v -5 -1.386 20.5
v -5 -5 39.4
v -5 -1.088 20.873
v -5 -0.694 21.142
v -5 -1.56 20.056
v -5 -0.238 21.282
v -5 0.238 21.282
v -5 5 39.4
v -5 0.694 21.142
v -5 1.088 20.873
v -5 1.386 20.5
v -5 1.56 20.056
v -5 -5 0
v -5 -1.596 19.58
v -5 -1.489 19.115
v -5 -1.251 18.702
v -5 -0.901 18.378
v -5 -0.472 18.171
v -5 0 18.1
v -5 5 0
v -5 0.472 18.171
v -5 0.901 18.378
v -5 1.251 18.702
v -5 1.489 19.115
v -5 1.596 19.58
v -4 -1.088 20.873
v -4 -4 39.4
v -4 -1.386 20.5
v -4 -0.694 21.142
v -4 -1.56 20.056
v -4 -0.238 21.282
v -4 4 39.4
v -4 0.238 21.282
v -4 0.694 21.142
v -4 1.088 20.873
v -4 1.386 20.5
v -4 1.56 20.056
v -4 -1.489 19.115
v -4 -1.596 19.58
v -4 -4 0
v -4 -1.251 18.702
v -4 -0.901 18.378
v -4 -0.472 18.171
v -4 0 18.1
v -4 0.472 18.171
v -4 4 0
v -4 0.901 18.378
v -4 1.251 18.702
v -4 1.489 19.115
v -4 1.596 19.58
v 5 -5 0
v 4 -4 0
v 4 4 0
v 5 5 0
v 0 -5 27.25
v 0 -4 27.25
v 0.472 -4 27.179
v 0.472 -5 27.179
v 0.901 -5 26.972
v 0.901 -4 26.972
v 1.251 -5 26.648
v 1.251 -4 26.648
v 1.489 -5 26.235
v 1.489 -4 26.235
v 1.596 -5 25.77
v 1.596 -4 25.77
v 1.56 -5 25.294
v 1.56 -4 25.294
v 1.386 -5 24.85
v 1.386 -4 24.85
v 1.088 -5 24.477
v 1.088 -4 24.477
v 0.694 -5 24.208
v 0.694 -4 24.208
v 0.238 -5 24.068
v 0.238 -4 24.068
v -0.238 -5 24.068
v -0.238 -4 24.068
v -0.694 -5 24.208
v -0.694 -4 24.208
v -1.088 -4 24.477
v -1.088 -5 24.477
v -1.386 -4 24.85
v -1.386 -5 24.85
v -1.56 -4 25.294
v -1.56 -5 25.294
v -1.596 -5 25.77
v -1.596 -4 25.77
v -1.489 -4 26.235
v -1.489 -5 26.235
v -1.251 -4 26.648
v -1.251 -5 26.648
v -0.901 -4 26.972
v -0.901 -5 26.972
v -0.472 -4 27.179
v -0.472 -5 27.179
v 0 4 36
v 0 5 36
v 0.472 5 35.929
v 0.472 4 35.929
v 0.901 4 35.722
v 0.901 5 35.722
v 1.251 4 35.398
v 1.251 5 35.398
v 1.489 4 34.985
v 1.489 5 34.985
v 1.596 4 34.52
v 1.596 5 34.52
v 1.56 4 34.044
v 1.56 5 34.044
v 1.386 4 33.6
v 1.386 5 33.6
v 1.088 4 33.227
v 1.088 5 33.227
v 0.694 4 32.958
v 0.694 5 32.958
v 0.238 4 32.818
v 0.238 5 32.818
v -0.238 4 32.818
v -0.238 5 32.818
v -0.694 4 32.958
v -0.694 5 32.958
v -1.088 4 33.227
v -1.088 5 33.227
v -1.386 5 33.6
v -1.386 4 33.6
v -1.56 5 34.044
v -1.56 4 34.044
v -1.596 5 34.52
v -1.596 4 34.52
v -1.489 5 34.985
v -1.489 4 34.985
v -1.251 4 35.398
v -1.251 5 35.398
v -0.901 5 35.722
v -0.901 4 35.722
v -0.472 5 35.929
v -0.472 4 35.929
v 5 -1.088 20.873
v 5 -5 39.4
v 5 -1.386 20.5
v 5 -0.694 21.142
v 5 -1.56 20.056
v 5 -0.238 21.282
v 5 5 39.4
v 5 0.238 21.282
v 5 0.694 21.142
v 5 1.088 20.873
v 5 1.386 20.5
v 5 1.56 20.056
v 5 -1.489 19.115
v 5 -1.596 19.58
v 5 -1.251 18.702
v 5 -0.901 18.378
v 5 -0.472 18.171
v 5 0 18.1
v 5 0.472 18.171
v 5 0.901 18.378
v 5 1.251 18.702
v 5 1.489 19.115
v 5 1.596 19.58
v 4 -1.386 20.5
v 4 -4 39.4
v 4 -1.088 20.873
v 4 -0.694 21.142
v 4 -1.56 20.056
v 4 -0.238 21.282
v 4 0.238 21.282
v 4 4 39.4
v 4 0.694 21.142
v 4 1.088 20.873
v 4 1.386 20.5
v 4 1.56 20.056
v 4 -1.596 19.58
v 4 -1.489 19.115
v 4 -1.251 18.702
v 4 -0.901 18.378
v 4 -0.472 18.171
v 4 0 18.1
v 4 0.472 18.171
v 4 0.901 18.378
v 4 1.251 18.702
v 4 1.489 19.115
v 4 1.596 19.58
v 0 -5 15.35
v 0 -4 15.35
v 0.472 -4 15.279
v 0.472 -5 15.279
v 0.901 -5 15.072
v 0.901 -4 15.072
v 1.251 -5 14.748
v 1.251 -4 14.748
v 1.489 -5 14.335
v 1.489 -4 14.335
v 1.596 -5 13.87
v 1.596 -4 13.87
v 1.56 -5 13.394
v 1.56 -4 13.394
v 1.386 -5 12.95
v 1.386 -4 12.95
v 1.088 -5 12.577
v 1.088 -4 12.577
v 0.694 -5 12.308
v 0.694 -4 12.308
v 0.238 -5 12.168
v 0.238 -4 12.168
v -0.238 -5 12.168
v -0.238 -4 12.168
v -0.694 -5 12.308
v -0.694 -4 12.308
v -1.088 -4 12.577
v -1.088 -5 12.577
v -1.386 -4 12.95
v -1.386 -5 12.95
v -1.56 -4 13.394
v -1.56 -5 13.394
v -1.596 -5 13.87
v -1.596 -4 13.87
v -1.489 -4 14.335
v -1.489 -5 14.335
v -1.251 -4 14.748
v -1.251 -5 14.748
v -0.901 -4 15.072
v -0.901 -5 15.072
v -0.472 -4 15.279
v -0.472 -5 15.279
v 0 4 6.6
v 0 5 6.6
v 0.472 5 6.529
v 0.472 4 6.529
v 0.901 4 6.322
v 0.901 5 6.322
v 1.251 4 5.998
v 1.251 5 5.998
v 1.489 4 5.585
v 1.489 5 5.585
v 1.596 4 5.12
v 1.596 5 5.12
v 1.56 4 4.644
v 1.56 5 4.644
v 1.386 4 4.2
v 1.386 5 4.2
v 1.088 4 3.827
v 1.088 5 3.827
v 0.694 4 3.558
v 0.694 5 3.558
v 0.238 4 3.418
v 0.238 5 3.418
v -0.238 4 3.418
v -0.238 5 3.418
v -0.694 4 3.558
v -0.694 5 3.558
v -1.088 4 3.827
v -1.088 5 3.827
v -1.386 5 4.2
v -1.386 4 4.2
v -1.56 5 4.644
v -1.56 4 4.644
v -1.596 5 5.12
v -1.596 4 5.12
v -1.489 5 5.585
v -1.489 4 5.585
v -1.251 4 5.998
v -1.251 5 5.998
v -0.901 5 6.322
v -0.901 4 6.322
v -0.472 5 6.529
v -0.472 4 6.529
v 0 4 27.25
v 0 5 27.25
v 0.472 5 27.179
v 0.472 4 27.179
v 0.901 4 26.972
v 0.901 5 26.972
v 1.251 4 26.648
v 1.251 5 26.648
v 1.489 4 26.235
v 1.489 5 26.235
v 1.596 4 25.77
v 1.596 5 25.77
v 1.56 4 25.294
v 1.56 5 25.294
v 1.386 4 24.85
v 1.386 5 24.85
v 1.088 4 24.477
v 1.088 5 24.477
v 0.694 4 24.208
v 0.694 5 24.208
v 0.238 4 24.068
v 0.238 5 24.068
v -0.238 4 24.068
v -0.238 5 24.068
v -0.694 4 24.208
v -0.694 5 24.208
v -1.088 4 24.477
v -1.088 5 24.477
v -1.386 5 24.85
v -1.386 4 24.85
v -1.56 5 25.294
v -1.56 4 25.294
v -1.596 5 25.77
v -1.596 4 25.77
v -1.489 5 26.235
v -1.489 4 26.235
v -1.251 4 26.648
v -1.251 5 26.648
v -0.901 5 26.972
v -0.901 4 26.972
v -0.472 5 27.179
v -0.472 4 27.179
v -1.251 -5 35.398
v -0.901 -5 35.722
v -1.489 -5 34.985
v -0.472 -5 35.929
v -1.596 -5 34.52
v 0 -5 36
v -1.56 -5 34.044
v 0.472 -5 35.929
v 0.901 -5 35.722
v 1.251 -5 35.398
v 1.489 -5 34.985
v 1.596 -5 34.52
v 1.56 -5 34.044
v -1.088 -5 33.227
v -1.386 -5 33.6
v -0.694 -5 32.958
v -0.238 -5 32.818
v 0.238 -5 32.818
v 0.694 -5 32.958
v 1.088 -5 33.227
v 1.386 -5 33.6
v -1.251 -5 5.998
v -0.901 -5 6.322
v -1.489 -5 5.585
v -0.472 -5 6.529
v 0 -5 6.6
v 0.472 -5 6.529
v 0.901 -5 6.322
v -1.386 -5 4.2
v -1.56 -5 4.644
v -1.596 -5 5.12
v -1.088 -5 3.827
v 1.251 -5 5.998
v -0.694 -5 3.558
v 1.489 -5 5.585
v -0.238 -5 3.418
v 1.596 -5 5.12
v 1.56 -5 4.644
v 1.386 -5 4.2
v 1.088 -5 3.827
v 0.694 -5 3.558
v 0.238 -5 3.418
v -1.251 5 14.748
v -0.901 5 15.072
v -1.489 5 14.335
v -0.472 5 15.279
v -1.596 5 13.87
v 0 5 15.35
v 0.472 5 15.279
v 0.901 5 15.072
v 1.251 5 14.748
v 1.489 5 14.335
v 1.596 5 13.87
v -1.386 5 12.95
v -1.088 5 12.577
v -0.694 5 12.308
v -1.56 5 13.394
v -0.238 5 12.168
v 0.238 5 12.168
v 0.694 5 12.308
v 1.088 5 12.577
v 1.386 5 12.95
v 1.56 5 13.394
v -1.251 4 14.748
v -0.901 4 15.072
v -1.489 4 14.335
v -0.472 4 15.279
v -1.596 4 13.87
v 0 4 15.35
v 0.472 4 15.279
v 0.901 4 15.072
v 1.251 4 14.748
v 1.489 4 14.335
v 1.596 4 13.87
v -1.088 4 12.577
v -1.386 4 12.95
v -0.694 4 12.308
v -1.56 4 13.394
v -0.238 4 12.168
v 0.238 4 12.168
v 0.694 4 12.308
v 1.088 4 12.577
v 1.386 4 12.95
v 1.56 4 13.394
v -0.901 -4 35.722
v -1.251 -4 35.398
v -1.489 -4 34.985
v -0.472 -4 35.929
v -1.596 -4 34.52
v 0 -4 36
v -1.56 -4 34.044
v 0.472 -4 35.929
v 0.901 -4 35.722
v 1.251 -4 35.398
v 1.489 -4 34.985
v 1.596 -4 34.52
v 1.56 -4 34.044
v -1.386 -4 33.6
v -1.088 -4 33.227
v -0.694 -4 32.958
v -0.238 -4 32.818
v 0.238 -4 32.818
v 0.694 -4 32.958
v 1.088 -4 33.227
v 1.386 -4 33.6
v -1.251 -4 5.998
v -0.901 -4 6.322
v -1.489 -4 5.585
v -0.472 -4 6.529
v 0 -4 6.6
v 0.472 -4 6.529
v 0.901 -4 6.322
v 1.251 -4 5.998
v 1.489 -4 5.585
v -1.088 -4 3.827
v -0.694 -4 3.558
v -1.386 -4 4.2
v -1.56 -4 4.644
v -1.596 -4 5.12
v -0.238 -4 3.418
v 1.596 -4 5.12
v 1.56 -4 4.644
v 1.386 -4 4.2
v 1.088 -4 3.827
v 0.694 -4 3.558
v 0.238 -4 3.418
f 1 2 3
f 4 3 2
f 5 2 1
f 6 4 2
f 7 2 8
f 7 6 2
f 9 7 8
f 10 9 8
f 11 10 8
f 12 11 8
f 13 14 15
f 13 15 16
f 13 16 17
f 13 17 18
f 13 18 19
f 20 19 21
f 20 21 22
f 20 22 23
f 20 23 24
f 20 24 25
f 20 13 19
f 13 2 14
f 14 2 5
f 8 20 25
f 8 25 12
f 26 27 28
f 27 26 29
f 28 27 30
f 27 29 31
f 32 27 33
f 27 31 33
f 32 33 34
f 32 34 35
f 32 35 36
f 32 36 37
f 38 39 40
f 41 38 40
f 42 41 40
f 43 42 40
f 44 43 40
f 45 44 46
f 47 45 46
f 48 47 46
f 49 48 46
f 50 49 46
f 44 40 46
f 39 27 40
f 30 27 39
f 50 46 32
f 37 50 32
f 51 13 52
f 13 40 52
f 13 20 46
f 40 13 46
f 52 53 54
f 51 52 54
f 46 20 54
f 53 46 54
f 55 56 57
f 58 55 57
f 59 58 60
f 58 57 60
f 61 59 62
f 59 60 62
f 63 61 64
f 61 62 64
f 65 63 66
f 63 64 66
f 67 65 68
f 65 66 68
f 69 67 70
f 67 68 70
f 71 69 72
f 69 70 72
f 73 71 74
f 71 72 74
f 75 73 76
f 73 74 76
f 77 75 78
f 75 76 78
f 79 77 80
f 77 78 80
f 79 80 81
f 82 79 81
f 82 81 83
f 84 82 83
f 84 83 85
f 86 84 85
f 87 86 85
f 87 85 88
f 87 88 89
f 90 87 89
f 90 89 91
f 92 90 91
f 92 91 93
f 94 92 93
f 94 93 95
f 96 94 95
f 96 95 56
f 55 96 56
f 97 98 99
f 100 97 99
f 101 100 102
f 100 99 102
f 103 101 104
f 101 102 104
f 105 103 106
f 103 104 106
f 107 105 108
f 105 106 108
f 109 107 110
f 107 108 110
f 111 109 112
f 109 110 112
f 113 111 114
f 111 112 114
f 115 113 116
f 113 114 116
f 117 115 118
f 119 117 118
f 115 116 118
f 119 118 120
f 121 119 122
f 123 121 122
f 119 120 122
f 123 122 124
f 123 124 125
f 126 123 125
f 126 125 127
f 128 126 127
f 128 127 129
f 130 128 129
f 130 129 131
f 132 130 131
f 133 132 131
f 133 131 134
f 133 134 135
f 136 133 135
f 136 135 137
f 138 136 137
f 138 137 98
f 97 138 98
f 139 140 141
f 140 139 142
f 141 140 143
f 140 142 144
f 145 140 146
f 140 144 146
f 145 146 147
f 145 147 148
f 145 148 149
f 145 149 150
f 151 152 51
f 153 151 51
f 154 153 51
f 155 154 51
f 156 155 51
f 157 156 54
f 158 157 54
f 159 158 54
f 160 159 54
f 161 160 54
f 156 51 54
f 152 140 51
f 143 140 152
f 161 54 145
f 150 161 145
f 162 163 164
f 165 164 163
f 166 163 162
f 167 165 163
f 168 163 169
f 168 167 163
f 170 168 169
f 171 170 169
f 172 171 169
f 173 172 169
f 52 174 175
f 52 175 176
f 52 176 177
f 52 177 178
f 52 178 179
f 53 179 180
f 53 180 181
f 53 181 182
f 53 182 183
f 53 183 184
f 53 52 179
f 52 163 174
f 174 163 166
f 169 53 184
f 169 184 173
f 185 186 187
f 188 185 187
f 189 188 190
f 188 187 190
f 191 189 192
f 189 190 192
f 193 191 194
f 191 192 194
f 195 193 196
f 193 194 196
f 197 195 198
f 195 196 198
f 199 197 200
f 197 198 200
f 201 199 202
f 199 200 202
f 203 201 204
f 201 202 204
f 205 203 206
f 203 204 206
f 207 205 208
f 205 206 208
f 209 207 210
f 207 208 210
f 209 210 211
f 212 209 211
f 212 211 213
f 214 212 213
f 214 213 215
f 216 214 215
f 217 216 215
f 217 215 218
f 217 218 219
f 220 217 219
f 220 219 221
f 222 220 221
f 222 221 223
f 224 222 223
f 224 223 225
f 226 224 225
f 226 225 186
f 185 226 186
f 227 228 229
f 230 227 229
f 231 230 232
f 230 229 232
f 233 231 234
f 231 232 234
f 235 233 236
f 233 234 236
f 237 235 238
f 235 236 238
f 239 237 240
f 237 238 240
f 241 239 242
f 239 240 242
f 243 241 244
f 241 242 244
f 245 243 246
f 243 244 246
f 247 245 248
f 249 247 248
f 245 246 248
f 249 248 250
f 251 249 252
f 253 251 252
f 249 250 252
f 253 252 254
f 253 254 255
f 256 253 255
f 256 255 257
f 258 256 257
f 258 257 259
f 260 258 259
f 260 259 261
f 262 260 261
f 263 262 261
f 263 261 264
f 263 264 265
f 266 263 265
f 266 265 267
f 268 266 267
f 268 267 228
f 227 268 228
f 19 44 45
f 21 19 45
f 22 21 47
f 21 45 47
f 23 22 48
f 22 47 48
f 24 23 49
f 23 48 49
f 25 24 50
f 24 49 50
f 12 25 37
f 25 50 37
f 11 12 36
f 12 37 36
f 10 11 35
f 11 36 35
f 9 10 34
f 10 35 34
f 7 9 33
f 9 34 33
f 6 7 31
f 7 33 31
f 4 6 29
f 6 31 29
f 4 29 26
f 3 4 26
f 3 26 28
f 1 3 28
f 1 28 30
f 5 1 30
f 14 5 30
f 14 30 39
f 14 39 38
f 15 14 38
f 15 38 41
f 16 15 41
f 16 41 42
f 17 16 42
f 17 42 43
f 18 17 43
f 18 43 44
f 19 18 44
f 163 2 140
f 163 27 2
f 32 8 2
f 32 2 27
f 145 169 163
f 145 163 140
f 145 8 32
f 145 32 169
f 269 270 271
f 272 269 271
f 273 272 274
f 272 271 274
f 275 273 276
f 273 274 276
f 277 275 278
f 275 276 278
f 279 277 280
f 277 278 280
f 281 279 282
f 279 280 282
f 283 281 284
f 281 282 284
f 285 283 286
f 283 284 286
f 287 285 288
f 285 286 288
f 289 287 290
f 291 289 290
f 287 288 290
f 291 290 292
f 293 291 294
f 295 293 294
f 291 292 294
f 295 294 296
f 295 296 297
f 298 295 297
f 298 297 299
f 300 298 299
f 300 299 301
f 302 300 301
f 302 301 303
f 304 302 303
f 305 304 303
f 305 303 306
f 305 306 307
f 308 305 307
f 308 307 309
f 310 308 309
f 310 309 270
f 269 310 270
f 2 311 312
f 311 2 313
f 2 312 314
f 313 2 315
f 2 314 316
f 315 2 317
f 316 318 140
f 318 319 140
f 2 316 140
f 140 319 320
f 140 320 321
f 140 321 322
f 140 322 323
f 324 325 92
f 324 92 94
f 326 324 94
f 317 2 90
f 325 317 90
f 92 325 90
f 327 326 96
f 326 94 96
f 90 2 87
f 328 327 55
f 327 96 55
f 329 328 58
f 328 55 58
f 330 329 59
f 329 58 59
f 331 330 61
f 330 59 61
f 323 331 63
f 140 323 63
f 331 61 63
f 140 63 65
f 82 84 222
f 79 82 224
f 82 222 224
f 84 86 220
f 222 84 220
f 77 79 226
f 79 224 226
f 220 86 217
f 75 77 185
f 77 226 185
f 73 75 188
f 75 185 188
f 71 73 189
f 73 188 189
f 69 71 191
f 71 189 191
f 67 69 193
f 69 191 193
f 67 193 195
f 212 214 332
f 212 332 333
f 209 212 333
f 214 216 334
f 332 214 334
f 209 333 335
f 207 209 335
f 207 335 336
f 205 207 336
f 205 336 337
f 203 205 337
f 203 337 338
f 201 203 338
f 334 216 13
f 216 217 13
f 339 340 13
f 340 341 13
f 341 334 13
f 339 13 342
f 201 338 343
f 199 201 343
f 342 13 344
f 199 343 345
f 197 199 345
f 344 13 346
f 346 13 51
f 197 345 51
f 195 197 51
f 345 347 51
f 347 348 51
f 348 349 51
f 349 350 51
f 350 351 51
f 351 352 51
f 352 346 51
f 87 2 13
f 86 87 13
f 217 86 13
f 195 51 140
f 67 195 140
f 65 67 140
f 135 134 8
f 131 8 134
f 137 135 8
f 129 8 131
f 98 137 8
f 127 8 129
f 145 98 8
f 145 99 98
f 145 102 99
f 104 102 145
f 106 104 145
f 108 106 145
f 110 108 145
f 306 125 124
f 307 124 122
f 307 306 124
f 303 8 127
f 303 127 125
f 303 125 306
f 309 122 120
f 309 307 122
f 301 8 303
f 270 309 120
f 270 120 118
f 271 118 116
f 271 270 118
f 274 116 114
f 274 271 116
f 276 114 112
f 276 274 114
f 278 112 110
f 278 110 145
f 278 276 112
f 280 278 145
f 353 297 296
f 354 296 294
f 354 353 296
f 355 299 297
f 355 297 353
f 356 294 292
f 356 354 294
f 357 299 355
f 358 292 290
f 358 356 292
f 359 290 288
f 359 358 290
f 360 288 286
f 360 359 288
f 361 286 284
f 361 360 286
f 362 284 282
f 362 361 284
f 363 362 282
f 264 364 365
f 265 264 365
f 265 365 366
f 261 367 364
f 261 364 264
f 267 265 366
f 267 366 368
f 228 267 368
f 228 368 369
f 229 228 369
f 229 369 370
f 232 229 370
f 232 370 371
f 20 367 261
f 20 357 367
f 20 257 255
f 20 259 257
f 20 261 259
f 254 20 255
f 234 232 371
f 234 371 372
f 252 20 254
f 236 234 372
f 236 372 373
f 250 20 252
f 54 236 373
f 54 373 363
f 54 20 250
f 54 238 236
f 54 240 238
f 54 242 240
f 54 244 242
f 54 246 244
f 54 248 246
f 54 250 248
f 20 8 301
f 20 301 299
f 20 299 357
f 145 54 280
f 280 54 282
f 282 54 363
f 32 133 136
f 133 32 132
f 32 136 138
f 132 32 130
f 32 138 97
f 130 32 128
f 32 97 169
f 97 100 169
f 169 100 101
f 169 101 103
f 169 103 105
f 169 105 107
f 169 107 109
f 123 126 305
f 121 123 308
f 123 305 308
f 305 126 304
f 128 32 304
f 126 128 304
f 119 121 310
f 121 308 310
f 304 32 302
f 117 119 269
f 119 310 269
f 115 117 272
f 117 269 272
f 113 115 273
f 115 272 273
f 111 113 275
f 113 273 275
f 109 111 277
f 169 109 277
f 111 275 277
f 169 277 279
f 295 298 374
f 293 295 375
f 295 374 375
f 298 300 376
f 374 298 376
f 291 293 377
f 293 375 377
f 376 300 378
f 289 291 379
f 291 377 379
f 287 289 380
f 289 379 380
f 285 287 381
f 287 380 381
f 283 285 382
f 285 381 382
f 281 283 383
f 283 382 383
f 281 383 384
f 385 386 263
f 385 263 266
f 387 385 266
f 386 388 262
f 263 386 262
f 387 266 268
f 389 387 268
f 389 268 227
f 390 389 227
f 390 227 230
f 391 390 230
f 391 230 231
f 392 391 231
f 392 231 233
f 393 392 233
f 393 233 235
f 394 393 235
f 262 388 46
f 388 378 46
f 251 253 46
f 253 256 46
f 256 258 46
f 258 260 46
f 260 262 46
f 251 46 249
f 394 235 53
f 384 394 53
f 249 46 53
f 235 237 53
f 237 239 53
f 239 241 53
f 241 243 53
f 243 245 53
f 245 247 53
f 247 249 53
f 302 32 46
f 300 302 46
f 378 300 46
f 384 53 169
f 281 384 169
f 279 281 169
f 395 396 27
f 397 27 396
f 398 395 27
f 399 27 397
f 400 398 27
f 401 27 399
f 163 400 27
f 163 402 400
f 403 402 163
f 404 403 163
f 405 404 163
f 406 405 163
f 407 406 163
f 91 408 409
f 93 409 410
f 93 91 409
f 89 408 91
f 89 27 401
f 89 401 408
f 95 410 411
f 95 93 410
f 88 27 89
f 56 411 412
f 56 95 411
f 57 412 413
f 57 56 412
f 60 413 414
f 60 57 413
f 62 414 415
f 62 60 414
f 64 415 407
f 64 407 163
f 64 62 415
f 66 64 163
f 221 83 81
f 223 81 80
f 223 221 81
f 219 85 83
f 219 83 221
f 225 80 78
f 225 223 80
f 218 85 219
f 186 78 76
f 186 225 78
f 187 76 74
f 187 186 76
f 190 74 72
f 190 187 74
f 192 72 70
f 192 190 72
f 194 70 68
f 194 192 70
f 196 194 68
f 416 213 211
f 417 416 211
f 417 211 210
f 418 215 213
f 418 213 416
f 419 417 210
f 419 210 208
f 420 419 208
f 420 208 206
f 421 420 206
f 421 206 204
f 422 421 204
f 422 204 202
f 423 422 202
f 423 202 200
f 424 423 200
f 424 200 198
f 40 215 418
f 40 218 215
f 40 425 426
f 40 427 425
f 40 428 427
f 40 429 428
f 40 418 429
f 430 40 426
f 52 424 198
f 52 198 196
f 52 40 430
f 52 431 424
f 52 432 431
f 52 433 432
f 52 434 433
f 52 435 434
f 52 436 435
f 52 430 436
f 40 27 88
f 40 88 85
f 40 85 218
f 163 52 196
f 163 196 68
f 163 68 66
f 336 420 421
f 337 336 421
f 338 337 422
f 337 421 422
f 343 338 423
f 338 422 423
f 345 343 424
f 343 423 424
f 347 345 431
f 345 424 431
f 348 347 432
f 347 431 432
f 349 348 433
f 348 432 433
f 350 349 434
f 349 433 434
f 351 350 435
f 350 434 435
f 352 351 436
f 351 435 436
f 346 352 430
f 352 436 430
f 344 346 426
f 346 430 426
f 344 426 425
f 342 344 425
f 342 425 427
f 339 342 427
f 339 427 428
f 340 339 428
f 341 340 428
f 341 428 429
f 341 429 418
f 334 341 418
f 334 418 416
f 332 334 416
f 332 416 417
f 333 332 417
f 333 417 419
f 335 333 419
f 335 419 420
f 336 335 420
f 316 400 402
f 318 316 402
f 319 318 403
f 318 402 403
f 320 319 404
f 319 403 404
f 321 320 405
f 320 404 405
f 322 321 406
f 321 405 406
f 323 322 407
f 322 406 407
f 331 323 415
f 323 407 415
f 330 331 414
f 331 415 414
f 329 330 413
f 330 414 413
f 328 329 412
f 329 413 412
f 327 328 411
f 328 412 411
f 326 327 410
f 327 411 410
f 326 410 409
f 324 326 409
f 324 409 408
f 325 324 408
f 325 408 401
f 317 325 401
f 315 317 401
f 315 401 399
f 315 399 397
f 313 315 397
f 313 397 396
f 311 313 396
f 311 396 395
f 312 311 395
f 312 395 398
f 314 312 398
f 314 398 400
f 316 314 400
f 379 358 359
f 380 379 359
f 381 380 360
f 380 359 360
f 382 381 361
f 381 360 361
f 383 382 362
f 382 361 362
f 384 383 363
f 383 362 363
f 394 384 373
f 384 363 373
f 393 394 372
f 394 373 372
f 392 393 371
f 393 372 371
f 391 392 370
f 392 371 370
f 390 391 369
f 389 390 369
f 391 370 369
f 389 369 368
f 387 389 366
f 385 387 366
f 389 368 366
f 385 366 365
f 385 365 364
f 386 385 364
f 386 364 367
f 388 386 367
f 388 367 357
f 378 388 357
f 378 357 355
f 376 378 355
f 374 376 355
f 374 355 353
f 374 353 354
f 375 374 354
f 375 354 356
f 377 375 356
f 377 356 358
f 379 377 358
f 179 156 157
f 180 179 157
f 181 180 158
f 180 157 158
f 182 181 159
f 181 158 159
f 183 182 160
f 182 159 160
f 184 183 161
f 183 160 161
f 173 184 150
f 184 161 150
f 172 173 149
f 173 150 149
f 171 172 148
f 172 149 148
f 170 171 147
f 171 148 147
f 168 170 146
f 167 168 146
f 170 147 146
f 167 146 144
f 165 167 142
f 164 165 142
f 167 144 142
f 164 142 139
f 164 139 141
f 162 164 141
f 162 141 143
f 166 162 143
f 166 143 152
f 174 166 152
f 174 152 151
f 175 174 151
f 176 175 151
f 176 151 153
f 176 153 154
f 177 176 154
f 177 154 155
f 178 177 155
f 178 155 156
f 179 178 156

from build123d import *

# Parameters (mm, degrees)
SKETCH_1_W          = 10
SKETCH_1_H          = 10
SKETCH_1_W_2        = 8
SKETCH_1_H_2        = 8
EXTRUDE_1_DEPTH     = 39.4
SKETCH_2_R          = 1.6
CUT_EXTRUDE_1_DEPTH = 41.9555857
SKETCH_3_R          = 1.6
CUT_EXTRUDE_2_DEPTH = 41.9555857
SKETCH_4_R          = 1.6
CUT_EXTRUDE_3_DEPTH = 41.9555857


with BuildPart() as part:
    # ｽｹｯﾁ1 → 押し出し-薄板1 (new body)
    with BuildSketch(Plane.XY):
        Rectangle(SKETCH_1_W, SKETCH_1_H)
        Rectangle(SKETCH_1_W_2, SKETCH_1_H_2, mode=Mode.SUBTRACT)
    extrude(amount=EXTRUDE_1_DEPTH)

    # ｽｹｯﾁ2 → ｶｯﾄ - 押し出し1 (cut, through all)
    with BuildSketch(Plane(origin=(0, 5, 0), x_dir=(1, 0, 0), z_dir=(0, 1, 0))):
        with Locations(Location((0, -5, 0), (0, 0, 270))):
            Circle(SKETCH_2_R)
        with Locations(Location((0, -34.4, 0), (0, 0, 270))):
            Circle(SKETCH_2_R)
    extrude(amount=-CUT_EXTRUDE_1_DEPTH, mode=Mode.SUBTRACT)

    # ｽｹｯﾁ3 → ｶｯﾄ - 押し出し2 (cut, through all)
    with BuildSketch(Plane(origin=(0, 5, 0), x_dir=(1, 0, 0), z_dir=(0, 1, 0))):
        with Locations(Location((0, -13.75, 0), (0, 0, 270))):
            Circle(SKETCH_3_R)
        with Locations(Location((0, -25.65, 0), (0, 0, 270))):
            Circle(SKETCH_3_R)
    extrude(amount=-CUT_EXTRUDE_2_DEPTH, mode=Mode.SUBTRACT)

    # ｽｹｯﾁ4 → ｶｯﾄ - 押し出し3 (cut, through all)
    with BuildSketch(Plane(origin=(5, 0, 0), x_dir=(0, 0, -1), z_dir=(1, 0, 0))):
        with Locations((-19.7, 0)):
            Circle(SKETCH_4_R)
    extrude(amount=-CUT_EXTRUDE_3_DEPTH, mode=Mode.SUBTRACT)


solid = part.part
